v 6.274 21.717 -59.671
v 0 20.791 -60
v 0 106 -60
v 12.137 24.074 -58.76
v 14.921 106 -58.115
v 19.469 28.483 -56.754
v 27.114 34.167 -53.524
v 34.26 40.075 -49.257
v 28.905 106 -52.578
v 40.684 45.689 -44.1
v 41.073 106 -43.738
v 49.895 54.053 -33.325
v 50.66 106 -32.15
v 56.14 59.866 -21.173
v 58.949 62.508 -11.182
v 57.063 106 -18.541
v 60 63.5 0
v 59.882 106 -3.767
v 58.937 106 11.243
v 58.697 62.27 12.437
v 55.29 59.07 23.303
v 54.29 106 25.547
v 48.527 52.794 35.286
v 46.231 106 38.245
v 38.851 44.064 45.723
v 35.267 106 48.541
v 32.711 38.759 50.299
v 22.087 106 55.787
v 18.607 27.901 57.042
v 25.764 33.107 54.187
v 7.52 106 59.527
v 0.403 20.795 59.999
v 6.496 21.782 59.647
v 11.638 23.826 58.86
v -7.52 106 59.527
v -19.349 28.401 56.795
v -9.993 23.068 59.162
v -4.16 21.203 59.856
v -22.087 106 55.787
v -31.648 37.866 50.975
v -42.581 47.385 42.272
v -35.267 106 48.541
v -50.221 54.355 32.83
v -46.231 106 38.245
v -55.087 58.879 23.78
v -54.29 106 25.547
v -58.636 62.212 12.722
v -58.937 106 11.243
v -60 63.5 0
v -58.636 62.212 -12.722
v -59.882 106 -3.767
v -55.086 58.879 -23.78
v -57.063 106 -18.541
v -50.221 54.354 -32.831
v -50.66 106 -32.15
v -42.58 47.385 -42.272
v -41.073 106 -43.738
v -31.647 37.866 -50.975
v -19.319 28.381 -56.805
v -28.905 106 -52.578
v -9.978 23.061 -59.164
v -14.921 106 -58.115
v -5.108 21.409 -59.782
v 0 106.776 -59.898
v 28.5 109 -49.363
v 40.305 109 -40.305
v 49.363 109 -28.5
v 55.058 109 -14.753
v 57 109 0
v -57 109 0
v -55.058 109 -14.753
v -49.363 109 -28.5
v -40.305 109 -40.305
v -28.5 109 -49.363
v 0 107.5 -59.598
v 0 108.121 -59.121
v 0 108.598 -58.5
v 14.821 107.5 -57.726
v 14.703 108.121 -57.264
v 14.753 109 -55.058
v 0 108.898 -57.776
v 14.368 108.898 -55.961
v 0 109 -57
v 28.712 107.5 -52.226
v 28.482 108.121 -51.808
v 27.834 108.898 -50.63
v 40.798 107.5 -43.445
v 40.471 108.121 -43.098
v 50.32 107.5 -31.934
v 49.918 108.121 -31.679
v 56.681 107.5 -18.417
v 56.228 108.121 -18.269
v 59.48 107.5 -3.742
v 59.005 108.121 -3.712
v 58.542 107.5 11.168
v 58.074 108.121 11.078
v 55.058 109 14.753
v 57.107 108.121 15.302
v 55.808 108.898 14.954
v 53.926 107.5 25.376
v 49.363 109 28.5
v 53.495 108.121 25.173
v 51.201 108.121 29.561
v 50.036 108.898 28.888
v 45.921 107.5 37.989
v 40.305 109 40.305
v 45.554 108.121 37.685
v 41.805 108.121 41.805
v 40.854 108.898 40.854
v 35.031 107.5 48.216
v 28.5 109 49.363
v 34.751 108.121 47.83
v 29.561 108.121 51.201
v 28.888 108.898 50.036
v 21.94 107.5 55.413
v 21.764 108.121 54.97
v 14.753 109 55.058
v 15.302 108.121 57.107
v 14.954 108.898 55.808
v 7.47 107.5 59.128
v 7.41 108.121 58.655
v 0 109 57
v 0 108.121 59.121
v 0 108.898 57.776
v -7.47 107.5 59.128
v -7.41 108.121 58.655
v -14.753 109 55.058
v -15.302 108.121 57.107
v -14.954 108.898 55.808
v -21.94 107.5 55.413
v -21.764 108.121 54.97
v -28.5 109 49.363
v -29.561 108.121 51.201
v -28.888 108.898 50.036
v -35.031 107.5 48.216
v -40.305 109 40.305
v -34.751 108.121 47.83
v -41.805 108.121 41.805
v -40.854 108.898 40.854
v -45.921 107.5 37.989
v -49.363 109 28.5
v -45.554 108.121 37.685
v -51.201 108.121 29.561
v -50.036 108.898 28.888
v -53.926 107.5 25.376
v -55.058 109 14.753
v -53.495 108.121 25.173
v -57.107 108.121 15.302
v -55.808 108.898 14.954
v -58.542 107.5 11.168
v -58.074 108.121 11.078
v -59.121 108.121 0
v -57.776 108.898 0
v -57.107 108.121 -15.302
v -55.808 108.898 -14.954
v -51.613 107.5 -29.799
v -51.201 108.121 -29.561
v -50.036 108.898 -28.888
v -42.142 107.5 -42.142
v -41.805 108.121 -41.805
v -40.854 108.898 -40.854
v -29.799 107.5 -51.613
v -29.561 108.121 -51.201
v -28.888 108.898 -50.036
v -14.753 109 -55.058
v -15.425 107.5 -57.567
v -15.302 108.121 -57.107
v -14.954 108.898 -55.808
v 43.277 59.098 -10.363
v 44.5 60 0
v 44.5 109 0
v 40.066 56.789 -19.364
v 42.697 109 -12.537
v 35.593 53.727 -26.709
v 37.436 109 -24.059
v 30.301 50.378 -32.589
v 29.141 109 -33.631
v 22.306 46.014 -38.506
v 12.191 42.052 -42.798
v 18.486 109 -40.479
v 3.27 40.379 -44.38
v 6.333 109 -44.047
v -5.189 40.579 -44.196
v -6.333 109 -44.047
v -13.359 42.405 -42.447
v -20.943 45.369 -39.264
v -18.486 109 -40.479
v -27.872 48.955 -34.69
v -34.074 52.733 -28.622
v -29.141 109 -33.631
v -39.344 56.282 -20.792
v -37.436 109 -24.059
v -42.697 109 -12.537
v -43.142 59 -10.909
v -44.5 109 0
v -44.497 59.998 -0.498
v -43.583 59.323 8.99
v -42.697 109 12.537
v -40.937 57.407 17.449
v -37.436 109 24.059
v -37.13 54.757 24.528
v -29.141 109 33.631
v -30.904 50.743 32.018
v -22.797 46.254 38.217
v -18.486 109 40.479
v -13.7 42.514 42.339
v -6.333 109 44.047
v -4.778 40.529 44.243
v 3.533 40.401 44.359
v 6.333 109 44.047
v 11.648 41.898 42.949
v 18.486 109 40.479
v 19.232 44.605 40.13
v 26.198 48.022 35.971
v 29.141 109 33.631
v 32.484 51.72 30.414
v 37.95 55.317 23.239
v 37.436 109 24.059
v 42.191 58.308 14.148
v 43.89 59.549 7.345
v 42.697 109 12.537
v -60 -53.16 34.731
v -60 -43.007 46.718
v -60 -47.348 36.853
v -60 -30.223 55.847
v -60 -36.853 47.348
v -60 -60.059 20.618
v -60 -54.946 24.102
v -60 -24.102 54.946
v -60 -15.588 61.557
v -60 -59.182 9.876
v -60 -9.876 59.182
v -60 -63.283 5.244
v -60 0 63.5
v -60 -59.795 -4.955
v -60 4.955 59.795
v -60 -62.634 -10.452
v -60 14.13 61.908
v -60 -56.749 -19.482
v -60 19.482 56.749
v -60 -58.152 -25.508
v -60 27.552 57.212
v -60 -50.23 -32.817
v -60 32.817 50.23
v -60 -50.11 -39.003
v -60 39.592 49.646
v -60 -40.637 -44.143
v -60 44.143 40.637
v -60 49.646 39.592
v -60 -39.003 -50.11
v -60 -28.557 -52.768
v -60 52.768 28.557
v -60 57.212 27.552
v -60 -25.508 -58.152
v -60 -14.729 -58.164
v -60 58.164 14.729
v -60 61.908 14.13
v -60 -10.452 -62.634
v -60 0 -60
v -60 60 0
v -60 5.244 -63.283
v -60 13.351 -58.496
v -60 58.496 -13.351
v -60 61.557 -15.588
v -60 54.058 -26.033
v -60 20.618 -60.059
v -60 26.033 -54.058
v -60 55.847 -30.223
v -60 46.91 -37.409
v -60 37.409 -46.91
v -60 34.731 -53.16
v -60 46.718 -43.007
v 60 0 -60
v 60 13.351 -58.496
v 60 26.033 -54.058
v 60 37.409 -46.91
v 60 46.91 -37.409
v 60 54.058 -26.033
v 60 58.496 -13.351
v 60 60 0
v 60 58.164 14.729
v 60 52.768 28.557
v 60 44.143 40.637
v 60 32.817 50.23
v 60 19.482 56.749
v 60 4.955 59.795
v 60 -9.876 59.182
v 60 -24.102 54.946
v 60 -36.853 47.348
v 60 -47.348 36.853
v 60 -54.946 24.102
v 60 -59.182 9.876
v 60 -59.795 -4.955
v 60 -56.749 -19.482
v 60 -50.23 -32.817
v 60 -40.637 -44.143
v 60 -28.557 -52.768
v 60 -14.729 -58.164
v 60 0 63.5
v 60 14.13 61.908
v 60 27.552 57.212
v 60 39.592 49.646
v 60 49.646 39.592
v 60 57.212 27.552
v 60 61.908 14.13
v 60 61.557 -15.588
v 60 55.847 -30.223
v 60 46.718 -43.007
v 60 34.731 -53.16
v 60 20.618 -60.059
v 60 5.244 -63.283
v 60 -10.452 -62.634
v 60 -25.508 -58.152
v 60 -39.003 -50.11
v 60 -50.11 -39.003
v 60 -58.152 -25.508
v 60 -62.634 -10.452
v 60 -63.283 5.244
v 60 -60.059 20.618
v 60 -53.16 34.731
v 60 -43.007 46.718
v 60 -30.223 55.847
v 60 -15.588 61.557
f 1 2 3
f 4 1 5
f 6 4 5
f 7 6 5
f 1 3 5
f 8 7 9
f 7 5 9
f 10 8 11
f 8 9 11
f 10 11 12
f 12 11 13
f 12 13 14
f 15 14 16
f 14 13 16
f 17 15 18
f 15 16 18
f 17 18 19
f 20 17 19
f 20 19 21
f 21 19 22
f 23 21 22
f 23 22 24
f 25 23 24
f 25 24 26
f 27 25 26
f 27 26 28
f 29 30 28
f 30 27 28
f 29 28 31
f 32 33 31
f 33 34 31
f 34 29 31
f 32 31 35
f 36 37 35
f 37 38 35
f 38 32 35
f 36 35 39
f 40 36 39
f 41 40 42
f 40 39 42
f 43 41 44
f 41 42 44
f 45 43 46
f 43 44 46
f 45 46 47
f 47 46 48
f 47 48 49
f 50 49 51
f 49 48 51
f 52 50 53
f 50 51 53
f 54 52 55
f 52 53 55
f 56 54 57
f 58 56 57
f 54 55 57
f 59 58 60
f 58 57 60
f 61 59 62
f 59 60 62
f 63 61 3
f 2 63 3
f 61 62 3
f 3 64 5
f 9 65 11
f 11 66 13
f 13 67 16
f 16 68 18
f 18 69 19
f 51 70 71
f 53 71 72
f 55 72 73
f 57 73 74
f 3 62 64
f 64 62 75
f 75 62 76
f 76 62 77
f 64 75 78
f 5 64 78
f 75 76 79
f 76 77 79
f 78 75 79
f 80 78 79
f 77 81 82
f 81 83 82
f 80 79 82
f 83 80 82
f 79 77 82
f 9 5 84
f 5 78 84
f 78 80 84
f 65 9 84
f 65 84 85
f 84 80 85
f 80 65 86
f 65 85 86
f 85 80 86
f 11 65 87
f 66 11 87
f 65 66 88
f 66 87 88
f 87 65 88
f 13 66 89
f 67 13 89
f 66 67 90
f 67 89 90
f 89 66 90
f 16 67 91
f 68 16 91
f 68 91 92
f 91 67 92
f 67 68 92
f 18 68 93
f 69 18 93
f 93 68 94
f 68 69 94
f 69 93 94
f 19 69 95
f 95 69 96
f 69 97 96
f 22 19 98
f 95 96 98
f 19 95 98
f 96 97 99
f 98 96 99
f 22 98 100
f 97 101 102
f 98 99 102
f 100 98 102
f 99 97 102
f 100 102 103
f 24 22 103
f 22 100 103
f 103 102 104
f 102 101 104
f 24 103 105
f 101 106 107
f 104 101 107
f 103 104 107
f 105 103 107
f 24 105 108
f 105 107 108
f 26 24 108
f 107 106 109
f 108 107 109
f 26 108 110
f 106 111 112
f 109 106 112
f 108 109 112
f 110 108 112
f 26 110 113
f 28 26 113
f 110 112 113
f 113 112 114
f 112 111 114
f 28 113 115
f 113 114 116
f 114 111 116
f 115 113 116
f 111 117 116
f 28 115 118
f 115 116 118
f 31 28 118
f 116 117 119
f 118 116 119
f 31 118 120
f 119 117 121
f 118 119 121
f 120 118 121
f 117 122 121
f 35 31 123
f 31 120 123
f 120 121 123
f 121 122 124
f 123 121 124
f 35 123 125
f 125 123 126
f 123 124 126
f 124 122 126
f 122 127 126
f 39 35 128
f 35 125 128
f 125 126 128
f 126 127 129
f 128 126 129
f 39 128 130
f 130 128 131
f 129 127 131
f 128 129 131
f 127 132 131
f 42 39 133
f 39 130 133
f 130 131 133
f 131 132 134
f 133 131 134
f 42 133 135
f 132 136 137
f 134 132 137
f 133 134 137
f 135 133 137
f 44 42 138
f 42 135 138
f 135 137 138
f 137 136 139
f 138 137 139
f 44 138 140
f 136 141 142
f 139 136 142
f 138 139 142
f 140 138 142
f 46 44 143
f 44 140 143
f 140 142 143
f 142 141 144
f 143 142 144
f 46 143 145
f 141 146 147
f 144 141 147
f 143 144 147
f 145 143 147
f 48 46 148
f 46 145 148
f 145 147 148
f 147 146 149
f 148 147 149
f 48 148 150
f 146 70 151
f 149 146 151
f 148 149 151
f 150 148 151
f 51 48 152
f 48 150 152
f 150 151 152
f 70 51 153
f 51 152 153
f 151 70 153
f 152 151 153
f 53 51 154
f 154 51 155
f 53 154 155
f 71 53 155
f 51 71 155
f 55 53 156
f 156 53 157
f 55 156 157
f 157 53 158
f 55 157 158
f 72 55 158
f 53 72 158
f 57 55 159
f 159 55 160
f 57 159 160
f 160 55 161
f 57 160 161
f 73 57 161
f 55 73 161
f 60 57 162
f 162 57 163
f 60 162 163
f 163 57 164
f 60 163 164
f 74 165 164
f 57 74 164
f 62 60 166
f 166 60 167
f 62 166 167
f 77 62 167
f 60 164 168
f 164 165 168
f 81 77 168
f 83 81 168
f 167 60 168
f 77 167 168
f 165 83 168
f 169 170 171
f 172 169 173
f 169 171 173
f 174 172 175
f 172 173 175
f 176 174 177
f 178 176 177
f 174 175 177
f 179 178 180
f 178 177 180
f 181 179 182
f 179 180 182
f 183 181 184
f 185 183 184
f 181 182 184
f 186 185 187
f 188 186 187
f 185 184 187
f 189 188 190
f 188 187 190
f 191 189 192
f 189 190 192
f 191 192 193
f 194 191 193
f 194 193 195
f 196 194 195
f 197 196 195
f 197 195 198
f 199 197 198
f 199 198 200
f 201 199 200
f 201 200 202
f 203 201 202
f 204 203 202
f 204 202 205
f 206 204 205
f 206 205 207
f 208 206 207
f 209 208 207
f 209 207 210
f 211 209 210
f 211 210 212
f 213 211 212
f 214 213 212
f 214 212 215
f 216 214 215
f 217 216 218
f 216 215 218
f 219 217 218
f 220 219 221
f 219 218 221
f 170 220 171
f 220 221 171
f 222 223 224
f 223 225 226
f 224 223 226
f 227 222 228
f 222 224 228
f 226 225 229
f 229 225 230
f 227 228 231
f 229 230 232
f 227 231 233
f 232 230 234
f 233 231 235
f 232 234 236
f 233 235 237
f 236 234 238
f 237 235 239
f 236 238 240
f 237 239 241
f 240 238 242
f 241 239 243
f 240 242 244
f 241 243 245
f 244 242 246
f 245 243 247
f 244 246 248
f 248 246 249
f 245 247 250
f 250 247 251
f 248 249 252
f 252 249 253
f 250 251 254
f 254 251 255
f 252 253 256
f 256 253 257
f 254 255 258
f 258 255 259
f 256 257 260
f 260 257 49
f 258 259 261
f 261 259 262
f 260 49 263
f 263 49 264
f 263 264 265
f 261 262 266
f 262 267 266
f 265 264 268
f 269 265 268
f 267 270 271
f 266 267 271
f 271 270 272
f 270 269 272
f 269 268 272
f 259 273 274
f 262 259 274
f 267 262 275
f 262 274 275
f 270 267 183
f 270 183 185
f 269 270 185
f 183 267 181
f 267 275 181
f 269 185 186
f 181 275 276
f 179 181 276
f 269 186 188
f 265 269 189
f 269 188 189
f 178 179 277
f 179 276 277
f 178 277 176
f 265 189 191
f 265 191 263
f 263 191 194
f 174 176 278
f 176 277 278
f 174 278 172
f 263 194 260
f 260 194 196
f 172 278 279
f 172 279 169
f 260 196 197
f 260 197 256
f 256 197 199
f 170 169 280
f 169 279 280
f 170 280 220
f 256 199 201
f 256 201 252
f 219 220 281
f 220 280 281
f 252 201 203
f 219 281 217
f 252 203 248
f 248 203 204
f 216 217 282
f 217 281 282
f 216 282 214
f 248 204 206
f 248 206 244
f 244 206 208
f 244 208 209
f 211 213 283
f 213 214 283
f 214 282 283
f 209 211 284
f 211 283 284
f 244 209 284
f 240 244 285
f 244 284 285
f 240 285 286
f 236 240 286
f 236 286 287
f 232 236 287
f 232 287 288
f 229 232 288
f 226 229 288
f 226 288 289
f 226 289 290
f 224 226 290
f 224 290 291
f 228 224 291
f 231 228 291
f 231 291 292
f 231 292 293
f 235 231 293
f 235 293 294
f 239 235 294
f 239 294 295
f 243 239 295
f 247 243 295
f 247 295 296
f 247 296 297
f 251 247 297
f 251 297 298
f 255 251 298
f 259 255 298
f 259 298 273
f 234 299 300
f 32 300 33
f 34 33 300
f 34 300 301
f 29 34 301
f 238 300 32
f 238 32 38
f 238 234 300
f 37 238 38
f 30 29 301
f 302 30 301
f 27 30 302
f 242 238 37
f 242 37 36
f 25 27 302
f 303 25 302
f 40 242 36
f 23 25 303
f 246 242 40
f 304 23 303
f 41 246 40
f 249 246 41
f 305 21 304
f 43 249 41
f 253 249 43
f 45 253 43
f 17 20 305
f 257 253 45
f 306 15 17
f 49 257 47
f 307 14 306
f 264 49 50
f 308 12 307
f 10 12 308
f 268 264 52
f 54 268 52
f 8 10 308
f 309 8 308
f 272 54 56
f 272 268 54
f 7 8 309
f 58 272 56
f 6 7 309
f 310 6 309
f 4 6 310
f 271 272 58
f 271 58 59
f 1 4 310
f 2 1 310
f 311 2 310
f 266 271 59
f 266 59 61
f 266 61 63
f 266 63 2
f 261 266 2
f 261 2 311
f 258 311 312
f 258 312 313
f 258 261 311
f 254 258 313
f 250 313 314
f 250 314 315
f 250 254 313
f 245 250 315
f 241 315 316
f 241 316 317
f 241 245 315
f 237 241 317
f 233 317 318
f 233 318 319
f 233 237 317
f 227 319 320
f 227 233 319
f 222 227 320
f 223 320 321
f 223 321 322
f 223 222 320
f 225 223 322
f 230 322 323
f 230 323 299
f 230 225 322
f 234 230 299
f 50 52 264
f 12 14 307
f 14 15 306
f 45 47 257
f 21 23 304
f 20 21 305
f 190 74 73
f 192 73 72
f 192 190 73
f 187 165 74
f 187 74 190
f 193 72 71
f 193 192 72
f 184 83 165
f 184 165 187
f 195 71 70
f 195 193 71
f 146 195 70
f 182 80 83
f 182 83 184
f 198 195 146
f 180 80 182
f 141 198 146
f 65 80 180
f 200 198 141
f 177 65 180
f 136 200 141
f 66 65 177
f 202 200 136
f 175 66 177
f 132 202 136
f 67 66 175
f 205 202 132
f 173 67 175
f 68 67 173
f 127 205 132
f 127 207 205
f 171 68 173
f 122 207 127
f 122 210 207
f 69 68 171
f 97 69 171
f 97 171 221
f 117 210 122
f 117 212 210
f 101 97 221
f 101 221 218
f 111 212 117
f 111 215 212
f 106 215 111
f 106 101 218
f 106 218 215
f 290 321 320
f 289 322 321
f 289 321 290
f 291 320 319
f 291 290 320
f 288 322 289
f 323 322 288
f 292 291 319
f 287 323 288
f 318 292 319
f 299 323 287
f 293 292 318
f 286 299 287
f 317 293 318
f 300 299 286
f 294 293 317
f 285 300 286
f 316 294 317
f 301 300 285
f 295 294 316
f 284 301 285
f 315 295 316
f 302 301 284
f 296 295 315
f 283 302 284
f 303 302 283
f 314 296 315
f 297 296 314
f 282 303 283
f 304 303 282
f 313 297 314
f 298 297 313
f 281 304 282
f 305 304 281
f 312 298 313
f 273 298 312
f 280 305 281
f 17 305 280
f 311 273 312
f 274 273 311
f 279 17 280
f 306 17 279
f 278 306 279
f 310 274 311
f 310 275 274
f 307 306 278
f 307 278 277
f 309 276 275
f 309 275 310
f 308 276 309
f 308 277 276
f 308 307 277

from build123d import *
from build123d.topology import SkipClean

# Parameters (mm, degrees)
SKETCH1_W                  = 120
SKETCH1_H                  = 63.5
SKETCH2_W                  = 60
SKETCH2_H                  = 88.209377114
HOLE1_D                    = 120
M80_CLEARANCE_HOLE1_REACH  = 195.361
M80_CLEARANCE_HOLE1_BORE_R = 44.5
FILLET1_R                  = 3


with BuildPart() as part:
    # Sketch1 → Revolve1 (revolve)
    with BuildSketch(Plane(origin=(0, 0, 0), x_dir=(-1, 0, 0), z_dir=(0, 0, -1)), mode=Mode.PRIVATE) as revolve1_sk:
        with Locations((0, 31.75)):
            Rectangle(SKETCH1_W, SKETCH1_H)
    revolve(revolve1_sk.sketch.rotate(Axis((60, 0, 0), (-1, 0, 0)), 270), axis=Axis((60, 0, 0), (-1, 0, 0)))

    # Sketch2 → Revolve2 (revolve)
    with SkipClean():  # the faces are left unmerged after this step: merging them gives an invalid solid
        with BuildSketch(Plane.XY, mode=Mode.PRIVATE) as revolve2_sk:
            with Locations((30, 64.895311443)):
                Rectangle(SKETCH2_W, SKETCH2_H)
        revolve(revolve2_sk.sketch.rotate(Axis((0, 109, 0), (0, -1, 0)), 270), axis=Axis((0, 109, 0), (0, -1, 0)))

    # Hole1 (through all)
    with Locations(Plane.ZY.offset(60)):
        with Locations((0, 0)):
            Hole(HOLE1_D / 2)

    # M80 Clearance Hole1 bore → M80 Clearance Hole1 (cut, up to next)
    with BuildSketch(Plane(origin=(0, 109, 0), x_dir=(1, 0, 0), z_dir=(0, 1, 0)), mode=Mode.PRIVATE) as m80_clearance_hole1_sk1:
        Circle(M80_CLEARANCE_HOLE1_BORE_R)
    m80_clearance_hole1_tool1 = extrude(m80_clearance_hole1_sk1.sketch, amount=-M80_CLEARANCE_HOLE1_REACH, mode=Mode.PRIVATE) & part.part
    add(m80_clearance_hole1_tool1.solids().sort_by_distance((0, 109, 0))[0], mode=Mode.SUBTRACT)

    # Fillet1
    fillet1_edges = [part.edges().sort_by_distance(p)[0] for p in [
        (0, 109, 60),
    ]]
    fillet(fillet1_edges, radius=FILLET1_R)


solid = part.part
